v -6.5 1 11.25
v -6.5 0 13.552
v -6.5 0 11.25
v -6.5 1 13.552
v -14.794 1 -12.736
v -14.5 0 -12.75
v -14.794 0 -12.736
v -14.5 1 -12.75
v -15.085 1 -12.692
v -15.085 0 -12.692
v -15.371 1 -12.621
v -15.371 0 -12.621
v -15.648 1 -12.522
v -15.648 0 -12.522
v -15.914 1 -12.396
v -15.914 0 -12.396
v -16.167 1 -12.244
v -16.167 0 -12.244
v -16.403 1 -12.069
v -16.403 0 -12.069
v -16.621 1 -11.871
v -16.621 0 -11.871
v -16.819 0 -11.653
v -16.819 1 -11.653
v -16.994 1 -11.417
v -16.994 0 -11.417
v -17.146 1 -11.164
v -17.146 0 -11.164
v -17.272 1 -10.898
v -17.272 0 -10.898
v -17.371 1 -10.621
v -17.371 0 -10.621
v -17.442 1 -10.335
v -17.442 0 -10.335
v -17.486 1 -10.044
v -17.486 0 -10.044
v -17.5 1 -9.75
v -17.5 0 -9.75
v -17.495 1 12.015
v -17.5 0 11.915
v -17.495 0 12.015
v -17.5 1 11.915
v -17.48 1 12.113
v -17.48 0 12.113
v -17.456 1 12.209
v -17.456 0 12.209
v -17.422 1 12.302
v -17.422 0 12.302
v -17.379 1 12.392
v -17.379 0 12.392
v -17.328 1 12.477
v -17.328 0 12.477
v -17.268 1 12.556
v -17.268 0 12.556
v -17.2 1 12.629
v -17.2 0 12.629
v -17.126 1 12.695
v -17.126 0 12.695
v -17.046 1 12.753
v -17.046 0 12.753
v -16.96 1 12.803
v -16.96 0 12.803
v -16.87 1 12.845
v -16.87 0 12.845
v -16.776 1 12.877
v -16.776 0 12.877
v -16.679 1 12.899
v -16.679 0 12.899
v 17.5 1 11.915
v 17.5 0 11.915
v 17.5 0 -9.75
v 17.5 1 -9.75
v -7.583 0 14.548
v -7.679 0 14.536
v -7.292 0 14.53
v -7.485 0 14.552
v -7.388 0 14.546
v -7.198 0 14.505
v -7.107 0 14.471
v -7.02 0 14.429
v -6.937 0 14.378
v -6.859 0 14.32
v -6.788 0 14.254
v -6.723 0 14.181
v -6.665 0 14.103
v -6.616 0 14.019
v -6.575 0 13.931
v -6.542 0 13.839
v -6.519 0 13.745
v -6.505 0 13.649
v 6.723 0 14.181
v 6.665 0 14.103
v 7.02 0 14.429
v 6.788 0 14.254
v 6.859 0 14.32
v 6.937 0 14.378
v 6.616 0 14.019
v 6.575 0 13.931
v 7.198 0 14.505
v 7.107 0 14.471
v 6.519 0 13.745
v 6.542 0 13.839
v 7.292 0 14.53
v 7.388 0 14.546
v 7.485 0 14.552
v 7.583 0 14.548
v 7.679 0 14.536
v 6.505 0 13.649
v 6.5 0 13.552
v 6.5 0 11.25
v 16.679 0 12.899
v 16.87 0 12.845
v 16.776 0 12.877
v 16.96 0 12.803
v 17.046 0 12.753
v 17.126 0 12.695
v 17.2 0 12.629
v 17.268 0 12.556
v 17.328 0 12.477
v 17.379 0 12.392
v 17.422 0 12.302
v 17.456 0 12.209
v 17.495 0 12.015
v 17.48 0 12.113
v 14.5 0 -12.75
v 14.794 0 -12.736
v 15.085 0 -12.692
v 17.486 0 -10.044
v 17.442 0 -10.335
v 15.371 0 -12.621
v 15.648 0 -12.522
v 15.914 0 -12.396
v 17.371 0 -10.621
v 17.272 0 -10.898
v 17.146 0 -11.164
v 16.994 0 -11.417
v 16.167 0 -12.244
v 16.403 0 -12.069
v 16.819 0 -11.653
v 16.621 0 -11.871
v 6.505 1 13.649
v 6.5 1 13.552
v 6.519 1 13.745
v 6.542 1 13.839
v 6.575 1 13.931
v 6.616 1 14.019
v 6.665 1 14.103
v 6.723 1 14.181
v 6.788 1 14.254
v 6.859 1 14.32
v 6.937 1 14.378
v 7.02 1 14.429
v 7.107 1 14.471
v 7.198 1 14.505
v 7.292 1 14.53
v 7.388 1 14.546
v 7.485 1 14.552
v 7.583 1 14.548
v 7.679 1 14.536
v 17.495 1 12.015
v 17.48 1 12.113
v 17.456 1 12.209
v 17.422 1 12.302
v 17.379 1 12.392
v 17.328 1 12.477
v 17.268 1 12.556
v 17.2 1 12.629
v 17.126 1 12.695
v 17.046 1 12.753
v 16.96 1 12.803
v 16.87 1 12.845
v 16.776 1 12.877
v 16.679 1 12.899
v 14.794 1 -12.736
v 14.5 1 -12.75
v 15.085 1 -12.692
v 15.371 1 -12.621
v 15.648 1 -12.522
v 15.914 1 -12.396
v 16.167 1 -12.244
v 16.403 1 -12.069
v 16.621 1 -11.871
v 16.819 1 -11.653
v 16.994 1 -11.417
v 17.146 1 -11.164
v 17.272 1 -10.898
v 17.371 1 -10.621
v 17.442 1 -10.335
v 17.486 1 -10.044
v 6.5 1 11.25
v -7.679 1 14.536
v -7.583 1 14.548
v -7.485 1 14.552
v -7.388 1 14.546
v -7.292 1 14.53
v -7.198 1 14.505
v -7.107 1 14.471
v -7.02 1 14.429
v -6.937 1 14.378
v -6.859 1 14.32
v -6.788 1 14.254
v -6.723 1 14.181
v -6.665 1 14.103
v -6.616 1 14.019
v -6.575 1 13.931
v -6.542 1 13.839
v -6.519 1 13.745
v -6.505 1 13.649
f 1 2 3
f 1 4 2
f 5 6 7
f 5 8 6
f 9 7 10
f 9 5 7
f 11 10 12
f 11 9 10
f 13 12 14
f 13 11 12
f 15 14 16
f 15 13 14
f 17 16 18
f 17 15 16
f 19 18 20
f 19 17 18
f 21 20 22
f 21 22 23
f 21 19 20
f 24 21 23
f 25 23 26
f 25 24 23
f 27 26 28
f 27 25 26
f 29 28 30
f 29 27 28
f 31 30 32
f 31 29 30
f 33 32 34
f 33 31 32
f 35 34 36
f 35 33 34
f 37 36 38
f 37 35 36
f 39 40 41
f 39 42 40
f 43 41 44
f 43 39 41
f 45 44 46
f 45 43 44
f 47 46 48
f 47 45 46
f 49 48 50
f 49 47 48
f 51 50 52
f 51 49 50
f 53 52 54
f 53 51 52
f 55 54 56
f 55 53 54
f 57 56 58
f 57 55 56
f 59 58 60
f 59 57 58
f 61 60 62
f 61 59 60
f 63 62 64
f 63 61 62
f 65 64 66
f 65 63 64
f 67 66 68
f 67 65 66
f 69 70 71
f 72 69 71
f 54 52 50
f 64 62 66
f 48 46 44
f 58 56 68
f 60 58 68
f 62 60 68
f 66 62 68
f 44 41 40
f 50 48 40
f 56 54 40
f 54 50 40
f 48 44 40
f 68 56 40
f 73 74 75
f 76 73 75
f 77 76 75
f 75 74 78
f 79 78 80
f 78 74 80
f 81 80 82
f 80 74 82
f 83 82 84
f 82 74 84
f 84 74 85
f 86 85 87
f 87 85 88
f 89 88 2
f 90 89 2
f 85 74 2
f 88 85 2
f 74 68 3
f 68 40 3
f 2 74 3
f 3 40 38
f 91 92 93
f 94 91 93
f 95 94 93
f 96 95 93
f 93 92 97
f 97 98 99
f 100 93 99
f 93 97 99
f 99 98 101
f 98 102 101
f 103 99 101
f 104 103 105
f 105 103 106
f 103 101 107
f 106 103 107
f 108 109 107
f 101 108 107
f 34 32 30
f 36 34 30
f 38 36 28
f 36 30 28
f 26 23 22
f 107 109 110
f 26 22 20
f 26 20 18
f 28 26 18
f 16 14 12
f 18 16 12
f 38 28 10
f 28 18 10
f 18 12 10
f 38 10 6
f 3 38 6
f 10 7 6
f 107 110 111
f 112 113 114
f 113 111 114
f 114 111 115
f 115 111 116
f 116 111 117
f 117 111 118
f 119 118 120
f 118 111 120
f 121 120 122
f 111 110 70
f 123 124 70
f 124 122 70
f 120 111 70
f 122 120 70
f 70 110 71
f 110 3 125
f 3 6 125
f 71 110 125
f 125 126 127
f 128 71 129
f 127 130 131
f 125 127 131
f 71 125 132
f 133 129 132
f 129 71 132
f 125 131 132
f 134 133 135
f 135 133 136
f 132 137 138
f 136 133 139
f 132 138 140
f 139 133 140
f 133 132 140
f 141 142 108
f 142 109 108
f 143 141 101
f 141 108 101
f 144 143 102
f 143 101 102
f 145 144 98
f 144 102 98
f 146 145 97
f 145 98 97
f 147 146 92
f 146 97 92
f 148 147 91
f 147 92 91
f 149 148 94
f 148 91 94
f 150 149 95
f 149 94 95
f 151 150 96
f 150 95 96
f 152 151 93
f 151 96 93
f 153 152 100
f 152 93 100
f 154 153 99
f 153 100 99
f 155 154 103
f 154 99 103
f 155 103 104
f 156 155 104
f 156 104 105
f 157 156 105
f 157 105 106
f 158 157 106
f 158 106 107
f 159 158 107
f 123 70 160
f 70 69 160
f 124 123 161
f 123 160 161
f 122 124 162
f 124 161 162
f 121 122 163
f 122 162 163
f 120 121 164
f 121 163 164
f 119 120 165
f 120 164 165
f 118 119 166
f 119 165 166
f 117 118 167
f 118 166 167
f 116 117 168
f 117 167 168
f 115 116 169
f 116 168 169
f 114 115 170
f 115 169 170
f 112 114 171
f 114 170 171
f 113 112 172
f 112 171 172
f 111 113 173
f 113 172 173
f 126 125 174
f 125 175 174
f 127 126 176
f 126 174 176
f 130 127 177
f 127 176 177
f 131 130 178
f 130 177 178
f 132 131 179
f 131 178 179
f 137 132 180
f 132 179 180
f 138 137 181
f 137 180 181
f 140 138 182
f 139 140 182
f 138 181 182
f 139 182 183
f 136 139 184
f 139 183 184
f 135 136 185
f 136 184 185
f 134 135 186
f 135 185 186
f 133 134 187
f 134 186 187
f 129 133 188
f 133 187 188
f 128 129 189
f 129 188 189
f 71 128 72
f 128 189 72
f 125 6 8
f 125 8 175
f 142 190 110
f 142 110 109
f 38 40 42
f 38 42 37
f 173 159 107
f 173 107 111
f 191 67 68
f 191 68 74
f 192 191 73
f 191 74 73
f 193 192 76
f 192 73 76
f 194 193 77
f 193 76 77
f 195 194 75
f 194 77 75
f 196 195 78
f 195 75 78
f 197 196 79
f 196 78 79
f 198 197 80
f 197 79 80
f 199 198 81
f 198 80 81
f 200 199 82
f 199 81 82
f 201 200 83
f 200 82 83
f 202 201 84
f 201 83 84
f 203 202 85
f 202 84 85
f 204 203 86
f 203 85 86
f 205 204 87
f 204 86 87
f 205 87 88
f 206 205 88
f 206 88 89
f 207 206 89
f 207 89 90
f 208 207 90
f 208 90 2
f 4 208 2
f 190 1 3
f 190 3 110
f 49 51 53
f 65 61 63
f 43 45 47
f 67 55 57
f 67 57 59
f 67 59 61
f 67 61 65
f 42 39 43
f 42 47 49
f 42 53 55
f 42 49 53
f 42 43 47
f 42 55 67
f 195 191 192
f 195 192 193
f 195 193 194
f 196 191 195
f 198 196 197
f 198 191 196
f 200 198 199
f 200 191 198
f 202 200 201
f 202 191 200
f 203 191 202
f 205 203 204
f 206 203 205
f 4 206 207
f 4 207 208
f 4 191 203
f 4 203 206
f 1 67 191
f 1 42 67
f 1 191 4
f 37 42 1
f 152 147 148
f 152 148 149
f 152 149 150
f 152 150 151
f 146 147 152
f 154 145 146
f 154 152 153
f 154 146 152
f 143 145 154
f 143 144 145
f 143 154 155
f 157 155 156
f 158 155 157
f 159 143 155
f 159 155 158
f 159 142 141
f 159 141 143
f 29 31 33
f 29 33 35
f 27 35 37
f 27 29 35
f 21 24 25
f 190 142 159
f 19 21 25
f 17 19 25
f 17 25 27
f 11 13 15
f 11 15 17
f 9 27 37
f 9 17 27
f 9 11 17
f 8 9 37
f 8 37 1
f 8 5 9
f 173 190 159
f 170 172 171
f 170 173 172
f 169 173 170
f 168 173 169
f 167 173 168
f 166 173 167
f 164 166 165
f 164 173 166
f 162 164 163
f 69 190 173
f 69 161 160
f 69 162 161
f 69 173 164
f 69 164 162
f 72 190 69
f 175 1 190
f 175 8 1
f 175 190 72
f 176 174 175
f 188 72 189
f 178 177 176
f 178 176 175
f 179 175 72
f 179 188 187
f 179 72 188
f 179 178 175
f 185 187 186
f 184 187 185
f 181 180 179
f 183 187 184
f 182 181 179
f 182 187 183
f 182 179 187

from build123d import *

# Parameters (mm, degrees)
SKETCH_1_W          = 35
SKETCH_1_H          = 25.5
EXTRUDE_1_DEPTH     = 1
EXTRUDE_2_DEPTH     = 1
SKETCH_3_W          = 13
SKETCH_3_H          = 1.5
CUT_EXTRUDE_1_DEPTH = 23.908786524
FILLET_1_R          = 3
FILLET_2_R          = 1


with BuildPart() as part:
    # 草图1 → 凸台-拉伸1 (new body)
    with BuildSketch(Plane(origin=(0, 0, 0), x_dir=(1, 0, 0), z_dir=(0, 1, 0))):
        Rectangle(SKETCH_1_W, SKETCH_1_H)
    extrude(amount=EXTRUDE_1_DEPTH)

    # 草图2 → 凸台-拉伸2 (add)
    with BuildSketch(Plane(origin=(0, 1, 0), x_dir=(1, 0, 0), z_dir=(0, 1, 0))):
        Polygon((-17.5, -12.75), (-6.5, -14.75), (-6.5, -12.75), align=None)
        Polygon((17.5, -12.75), (6.5, -12.75), (6.5, -14.75), align=None)
    extrude(amount=-EXTRUDE_2_DEPTH)

    # 草图3 → 切除-拉伸1 (cut, through all)
    with BuildSketch(Plane(origin=(0, 1, 0), x_dir=(1, 0, 0), z_dir=(0, 1, 0))):
        with Locations((0, -12)):
            Rectangle(SKETCH_3_W, SKETCH_3_H)
    extrude(amount=-CUT_EXTRUDE_1_DEPTH, mode=Mode.SUBTRACT)

    # 圆角1
    fillet_1_edges = [part.edges().sort_by_distance(p)[0] for p in [
        (-17.5, 0.5, -12.75),
        (17.5, 0.5, -12.75),
    ]]
    fillet(fillet_1_edges, radius=FILLET_1_R)

    # 圆角2
    fillet_2_edges = [part.edges().sort_by_distance(p)[0] for p in [
        (-6.5, 0.5, 14.75),
        (6.5, 0.5, 14.75),
        (17.5, 0.5, 12.75),
        (-17.5, 0.5, 12.75),
    ]]
    fillet(fillet_2_edges, radius=FILLET_2_R)


solid = part.part
